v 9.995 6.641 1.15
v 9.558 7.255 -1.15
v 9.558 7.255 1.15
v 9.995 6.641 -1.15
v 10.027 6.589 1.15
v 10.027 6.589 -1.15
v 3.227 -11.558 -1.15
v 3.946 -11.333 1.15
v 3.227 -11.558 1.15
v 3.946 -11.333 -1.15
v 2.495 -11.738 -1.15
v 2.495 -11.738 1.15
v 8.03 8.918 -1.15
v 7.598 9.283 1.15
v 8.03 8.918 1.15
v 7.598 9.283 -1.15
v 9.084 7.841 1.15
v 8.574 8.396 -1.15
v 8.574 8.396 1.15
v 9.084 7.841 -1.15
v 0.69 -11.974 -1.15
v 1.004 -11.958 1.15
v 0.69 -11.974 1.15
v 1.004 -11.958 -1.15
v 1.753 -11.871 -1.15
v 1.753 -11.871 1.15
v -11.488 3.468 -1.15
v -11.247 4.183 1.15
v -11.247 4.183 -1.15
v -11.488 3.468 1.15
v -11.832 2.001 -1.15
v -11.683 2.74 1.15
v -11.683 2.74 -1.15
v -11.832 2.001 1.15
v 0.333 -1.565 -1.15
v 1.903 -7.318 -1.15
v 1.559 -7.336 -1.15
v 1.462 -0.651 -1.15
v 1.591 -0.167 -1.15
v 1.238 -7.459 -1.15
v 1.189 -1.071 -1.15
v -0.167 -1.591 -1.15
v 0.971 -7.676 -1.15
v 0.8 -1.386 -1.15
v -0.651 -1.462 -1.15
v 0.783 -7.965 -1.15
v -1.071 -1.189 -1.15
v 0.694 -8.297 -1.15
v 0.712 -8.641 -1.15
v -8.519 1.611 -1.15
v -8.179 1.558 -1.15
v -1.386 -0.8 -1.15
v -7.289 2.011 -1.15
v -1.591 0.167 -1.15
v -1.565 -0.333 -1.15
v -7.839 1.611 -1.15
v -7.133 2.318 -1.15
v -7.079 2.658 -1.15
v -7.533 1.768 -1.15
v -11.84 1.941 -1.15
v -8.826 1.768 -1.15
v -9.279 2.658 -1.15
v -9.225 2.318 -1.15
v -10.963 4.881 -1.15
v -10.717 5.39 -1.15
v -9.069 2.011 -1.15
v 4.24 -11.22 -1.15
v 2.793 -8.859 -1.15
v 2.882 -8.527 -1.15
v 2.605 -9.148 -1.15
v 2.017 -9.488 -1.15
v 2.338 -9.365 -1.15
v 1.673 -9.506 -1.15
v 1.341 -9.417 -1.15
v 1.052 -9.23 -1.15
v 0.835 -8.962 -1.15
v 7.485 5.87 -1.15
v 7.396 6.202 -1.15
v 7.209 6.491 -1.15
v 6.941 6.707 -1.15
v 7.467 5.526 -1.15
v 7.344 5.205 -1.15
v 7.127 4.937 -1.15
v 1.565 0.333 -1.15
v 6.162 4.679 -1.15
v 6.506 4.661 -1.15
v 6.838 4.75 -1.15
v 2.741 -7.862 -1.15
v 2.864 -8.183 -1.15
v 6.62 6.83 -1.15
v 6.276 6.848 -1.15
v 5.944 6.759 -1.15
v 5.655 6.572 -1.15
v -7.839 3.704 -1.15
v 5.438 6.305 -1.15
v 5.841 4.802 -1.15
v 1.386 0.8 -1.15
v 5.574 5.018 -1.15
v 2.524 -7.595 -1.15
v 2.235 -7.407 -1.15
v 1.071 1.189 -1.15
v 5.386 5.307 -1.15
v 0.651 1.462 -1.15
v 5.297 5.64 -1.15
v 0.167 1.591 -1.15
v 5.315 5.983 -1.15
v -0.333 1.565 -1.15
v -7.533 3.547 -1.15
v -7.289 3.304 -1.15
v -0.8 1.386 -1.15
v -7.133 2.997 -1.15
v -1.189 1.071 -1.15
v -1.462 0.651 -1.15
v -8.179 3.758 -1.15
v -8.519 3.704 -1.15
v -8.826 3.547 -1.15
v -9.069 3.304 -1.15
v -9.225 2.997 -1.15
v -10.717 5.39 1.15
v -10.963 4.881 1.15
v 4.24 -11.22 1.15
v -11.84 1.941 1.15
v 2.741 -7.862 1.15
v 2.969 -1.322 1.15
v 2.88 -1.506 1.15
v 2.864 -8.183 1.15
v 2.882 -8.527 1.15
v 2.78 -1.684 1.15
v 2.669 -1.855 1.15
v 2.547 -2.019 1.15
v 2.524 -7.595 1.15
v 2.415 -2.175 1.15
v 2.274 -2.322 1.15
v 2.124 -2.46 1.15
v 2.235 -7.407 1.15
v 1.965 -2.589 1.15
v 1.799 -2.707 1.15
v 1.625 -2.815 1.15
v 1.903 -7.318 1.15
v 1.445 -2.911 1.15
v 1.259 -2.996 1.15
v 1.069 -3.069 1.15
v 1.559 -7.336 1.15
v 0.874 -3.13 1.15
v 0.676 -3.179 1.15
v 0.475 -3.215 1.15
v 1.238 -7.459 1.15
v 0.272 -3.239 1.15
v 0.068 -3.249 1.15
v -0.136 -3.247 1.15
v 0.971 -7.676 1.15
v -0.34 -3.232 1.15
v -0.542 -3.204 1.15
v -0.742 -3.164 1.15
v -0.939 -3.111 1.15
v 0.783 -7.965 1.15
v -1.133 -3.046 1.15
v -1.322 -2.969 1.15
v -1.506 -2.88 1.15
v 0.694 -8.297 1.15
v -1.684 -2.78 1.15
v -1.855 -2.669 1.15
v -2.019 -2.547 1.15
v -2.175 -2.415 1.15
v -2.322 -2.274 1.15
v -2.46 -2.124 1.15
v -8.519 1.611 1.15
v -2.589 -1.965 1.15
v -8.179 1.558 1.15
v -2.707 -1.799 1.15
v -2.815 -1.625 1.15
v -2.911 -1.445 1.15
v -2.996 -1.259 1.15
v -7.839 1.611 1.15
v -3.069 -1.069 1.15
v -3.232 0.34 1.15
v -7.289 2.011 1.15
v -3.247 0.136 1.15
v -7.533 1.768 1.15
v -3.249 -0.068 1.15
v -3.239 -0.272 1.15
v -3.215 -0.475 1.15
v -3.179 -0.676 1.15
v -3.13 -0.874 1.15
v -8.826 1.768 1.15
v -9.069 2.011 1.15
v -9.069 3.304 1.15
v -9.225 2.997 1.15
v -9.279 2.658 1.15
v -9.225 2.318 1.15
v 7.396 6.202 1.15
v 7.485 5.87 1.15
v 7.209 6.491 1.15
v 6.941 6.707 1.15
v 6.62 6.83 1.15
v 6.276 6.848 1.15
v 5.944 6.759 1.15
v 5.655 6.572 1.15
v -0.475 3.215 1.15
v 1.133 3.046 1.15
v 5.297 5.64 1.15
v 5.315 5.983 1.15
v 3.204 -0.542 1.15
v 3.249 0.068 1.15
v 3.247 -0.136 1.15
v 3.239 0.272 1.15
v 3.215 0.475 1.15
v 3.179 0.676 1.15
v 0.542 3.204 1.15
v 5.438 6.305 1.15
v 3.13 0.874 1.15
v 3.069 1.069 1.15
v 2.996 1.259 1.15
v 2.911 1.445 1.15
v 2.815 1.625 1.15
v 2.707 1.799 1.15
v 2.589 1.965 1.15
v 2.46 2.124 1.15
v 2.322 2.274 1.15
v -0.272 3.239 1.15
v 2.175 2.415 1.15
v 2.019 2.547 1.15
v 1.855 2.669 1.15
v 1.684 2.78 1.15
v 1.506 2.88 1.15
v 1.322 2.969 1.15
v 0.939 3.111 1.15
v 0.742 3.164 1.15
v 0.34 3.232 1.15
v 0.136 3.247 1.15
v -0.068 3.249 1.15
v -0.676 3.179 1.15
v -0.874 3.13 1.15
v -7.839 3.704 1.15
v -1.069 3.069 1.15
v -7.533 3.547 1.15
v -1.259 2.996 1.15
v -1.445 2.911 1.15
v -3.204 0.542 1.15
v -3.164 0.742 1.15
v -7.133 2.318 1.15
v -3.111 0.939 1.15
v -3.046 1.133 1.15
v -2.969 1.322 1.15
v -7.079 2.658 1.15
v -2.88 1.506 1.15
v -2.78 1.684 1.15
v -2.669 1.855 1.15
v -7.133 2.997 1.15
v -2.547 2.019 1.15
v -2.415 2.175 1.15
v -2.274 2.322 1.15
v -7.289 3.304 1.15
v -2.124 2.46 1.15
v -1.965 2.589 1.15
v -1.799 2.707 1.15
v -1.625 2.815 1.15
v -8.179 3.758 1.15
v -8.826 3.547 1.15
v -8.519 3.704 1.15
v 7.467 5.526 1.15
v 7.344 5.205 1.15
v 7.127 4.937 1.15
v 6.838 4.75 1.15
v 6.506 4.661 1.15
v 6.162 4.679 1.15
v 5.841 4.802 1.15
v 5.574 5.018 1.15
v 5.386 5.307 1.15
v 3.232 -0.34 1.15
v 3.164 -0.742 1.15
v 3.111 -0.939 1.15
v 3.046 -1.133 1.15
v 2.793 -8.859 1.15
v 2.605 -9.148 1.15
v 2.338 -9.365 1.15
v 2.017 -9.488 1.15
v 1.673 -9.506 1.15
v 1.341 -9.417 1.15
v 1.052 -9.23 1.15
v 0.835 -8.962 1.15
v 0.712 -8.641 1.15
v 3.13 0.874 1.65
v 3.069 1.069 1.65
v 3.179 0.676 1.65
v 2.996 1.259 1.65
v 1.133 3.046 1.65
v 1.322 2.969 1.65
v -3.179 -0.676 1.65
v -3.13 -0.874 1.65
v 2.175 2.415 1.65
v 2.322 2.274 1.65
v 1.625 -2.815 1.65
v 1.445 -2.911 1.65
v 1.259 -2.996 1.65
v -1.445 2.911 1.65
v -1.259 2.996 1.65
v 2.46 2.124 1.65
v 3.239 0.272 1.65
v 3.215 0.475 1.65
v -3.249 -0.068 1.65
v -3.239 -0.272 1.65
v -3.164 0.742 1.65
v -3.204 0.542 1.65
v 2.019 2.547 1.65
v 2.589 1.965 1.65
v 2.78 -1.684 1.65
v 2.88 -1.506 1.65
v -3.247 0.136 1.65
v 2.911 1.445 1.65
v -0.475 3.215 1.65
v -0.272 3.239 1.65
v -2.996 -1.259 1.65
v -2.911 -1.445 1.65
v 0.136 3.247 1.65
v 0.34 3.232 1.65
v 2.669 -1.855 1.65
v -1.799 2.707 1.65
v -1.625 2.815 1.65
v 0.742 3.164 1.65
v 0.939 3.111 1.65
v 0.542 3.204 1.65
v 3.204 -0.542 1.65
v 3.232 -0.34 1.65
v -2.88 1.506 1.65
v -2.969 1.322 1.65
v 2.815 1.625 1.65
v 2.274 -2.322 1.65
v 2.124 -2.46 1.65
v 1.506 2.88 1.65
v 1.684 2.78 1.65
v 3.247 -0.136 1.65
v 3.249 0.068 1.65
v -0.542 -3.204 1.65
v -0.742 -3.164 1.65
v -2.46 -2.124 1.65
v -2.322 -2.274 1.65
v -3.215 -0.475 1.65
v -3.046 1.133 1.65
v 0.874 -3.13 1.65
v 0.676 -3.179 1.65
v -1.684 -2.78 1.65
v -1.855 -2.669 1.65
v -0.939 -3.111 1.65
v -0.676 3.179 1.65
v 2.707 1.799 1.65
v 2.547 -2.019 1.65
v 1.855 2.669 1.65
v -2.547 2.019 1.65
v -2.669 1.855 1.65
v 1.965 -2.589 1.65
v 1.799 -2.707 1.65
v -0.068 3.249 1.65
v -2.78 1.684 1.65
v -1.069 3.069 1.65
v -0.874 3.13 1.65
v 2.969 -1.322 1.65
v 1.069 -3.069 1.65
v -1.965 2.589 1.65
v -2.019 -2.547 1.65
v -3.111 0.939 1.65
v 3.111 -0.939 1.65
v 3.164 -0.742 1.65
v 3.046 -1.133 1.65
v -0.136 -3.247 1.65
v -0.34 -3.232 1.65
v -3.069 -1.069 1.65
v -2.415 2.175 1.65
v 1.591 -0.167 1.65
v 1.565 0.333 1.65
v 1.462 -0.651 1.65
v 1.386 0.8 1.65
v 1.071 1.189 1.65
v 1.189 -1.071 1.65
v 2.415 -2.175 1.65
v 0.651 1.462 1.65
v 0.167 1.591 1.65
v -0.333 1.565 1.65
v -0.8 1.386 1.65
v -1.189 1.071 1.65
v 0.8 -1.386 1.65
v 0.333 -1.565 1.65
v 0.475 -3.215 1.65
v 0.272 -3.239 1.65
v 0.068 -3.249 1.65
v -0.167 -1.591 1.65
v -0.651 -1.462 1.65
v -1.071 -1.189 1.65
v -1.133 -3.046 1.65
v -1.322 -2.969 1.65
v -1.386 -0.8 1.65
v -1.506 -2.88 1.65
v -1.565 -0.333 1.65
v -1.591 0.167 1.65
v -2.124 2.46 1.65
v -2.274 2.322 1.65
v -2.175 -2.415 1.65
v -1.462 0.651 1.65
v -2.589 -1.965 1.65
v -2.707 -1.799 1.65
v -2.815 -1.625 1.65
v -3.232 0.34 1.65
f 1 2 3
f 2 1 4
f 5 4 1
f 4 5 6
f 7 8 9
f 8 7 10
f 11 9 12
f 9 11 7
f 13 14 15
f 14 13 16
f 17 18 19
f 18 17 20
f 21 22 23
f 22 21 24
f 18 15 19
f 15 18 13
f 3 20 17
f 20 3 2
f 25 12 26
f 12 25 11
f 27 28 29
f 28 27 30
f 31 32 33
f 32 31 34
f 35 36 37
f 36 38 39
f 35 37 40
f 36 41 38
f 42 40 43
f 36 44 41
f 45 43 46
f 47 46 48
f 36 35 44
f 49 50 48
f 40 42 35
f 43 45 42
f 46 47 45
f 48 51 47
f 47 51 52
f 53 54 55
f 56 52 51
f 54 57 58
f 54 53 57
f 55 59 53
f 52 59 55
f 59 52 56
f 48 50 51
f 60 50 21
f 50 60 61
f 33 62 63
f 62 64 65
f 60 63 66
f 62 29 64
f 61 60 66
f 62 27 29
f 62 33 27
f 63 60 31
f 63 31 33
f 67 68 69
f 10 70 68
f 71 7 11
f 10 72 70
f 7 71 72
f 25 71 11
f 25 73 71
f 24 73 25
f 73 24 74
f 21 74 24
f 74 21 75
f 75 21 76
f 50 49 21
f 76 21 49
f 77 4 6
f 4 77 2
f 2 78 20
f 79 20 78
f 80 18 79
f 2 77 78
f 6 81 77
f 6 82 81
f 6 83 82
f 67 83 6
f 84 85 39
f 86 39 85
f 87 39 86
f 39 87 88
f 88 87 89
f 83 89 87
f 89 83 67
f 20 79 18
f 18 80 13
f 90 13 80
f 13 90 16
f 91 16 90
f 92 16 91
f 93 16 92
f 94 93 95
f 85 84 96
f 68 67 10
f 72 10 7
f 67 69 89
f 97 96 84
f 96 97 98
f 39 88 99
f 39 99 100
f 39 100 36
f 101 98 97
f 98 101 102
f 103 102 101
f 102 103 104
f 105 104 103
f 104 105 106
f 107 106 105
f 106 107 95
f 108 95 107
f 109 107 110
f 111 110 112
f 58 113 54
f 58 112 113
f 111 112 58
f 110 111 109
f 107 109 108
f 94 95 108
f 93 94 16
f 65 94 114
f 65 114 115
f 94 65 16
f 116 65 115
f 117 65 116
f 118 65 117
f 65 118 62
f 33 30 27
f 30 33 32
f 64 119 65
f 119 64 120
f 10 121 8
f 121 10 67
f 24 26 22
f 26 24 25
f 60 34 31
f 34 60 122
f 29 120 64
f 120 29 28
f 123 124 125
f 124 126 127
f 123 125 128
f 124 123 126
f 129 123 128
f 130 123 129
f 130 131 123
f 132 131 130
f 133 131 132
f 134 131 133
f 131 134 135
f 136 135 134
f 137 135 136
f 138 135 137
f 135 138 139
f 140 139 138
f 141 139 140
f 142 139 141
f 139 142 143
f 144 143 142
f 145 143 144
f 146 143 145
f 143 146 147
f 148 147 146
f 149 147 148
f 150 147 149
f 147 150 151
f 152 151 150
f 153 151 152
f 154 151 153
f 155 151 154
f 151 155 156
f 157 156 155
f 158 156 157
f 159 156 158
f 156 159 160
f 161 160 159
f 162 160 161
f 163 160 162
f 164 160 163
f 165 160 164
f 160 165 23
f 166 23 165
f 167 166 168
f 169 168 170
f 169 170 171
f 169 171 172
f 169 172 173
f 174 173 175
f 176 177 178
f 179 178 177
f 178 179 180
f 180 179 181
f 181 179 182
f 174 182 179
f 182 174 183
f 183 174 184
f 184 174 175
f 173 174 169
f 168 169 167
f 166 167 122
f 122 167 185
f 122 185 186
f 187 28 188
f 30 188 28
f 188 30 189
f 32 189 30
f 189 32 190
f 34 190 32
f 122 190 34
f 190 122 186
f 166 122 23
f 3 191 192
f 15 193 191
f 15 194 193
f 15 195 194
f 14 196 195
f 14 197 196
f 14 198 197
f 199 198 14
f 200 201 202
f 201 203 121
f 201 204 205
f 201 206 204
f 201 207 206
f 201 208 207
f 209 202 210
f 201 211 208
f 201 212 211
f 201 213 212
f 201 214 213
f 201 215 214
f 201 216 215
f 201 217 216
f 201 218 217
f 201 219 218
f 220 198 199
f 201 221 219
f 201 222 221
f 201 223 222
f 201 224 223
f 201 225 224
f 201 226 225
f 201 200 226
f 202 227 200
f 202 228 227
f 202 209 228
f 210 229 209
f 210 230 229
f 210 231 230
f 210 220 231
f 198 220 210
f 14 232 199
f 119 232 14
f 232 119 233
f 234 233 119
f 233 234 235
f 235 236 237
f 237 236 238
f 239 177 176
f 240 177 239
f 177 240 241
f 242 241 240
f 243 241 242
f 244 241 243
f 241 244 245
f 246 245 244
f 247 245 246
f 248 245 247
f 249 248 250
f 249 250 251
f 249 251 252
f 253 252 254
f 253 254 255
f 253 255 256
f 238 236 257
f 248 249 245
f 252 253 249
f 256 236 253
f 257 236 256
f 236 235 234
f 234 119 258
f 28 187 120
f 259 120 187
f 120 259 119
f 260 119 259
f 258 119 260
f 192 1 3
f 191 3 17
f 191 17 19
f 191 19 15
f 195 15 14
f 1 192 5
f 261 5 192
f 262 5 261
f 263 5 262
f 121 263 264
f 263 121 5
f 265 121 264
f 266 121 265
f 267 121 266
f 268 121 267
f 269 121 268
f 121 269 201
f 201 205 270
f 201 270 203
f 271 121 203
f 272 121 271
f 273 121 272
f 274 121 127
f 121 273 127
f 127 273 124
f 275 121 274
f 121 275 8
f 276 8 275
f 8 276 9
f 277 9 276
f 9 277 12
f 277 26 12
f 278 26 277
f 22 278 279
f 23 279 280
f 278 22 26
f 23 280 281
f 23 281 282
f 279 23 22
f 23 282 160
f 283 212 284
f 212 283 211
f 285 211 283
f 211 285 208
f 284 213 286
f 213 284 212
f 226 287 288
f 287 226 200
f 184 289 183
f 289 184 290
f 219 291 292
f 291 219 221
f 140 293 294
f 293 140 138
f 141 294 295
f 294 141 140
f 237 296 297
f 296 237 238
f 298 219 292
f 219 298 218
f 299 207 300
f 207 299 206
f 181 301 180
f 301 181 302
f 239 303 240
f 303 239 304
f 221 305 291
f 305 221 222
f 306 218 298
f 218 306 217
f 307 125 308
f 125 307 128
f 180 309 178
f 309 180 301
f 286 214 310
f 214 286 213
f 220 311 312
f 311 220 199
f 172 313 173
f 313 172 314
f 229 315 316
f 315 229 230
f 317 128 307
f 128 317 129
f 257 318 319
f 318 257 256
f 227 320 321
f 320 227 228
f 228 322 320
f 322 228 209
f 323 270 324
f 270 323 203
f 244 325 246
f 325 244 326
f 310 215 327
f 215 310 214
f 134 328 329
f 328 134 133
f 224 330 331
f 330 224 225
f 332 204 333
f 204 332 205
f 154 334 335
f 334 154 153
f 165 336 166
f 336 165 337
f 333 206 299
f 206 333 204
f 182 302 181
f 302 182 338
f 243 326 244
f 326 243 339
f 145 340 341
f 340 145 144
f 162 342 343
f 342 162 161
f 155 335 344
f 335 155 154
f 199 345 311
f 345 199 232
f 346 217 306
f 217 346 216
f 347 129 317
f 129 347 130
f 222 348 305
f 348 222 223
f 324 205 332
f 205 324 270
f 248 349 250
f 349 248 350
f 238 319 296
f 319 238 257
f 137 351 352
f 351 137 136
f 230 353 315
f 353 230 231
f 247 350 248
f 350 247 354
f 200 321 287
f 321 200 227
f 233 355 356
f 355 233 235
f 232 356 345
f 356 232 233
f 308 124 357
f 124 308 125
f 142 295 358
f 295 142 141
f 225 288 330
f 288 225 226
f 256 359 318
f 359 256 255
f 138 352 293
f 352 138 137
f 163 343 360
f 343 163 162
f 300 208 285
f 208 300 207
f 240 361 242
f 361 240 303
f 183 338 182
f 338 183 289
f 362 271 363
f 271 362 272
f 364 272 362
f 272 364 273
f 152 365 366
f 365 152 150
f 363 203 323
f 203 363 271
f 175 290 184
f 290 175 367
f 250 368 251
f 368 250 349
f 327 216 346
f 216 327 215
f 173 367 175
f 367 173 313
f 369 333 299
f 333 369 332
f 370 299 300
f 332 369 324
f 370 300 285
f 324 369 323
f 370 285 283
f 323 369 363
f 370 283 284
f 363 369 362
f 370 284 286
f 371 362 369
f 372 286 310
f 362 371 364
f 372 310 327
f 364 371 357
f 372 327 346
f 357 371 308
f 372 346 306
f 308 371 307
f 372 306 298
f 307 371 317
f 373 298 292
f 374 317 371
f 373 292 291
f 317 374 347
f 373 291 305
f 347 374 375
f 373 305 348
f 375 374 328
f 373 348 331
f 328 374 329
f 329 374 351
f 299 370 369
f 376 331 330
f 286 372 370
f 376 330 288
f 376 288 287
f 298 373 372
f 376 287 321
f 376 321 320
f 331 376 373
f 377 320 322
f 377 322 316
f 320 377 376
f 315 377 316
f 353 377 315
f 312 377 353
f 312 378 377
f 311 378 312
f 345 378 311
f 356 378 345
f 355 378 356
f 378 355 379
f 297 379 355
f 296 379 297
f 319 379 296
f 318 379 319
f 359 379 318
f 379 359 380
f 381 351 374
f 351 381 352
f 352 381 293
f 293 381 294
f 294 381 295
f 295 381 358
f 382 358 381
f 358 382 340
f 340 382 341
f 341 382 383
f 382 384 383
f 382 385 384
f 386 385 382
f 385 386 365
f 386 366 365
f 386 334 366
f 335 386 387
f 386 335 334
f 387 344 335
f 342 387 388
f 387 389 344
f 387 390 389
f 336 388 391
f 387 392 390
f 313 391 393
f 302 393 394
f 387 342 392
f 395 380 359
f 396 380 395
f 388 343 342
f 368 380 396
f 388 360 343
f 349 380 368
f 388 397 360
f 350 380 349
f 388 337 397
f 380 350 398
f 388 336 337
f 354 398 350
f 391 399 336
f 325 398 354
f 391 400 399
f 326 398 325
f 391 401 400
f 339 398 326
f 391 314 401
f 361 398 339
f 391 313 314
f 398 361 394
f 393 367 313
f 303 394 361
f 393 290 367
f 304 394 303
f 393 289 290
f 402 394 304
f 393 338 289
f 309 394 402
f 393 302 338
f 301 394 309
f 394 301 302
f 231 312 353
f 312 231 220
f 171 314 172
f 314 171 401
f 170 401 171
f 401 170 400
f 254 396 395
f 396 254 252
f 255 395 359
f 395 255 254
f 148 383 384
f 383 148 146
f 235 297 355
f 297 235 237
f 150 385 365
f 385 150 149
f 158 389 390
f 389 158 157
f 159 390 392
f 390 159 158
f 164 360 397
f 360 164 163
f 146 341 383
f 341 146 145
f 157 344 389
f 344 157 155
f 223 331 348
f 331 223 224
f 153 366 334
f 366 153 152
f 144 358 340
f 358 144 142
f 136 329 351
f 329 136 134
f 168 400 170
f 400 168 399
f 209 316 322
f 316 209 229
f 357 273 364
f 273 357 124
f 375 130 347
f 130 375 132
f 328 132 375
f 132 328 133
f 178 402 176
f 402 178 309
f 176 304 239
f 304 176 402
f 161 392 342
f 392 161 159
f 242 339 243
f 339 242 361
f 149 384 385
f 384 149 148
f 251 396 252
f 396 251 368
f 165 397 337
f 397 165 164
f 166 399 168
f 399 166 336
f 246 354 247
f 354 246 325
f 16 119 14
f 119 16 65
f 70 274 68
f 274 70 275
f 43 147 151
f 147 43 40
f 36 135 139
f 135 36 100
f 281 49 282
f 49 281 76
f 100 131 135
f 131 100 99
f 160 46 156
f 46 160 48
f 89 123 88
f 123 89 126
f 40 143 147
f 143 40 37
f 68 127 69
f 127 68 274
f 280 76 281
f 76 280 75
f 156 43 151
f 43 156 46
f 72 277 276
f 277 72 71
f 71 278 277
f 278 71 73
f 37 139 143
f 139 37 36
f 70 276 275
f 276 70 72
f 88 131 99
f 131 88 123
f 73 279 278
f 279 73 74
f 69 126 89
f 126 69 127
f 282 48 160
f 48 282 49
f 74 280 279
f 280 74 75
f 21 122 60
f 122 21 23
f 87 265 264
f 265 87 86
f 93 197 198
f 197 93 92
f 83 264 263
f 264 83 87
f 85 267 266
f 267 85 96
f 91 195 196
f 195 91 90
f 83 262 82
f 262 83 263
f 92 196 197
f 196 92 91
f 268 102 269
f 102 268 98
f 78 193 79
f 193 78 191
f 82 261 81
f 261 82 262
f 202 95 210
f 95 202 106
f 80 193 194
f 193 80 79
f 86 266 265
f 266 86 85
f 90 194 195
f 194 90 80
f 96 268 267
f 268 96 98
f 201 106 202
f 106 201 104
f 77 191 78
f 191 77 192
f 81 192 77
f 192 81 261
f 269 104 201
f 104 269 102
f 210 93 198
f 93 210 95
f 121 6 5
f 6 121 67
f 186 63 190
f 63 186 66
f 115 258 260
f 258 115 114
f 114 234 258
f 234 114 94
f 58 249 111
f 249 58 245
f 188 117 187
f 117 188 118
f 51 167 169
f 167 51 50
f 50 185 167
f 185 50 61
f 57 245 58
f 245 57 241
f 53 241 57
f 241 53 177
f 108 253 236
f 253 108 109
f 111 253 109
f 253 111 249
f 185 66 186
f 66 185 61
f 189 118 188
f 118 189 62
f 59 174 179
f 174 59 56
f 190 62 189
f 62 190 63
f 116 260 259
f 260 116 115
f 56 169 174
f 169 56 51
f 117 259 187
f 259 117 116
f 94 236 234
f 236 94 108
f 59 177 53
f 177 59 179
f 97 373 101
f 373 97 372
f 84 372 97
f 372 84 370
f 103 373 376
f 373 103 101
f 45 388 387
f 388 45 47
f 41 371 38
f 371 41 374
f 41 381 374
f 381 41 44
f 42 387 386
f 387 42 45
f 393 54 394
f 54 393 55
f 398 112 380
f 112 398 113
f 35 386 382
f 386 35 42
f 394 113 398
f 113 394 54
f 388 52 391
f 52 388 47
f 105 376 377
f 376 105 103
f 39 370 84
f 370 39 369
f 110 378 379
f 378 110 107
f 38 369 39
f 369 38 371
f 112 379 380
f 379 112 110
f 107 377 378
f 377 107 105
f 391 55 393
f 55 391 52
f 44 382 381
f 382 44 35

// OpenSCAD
// file: ../parameters.scad
global_clearance = 0.5;


//Main tube diameter - hole [mm]
main_tube_outer_diameter = 25.4;
main_tube_inner_diameter = 23.05;

// Nastavení parametrů rotoru

gliding_aggle = 14;         // tenhle úhel by se zřejmě v budoucnu měl počítat z požadované klouzavosti.

rotor_blade_AOA = 1.5;      // nastavení úhlu náběhu rotorového listu
rotor_blade_length = 970;   // délka rotorového listu
rotor_blade_depth = 50;     // hloubka rotorového listu
rotor_height = 180;         // výška otočného kloubu rotoru nad hlavní trubkou vírníku (odhad)
rotor_blades_count = 3;
rotor_delta_angle = 12;


rotor_head_width =  21.4;    //Rozměr 1 v nákresu
pilon_wall_thickness = 4.2;  // Rozměr 2 v nákresu
horizontal_screw_distance = 14.5;   // Rozměr 4 v nákresu
vertical_screw_distance = 12;       // rozměr 5 v nkresu

rotorhead_wall_thickness = 1.5; // sila tistenych dilu


bearing_outer_diameter = 6;    // Rozměr B1 v nákresu s přídavkem na toleranci otvoru
bearing_thickness = 7;        // Rozměr B2 v nákresu
bearing_shaft_length = 19.5;    // Rozměr B3 v nákresu


// nastavení parametrů motoru

engine_angle = -8;
engine_diameter = 55;
engine_offset = 55;

engine_screws_radius = 15;
engine_holes_radius = (24 + 44)/4;
engine_shatf_hole_diameter = 13;

// screw length step - minimum difference in length between two types of screws
basic_screw_length = 5;

//Screw diameter and nut for M5 [mm]
M5_screw_diameter=5.5;
M5_head_height = 5;
M5_head_diameter = 13+0.5;
M5_nut_height = 4.5;
M5_nut_diameter = 9.4;
M5_nut_pocket = 8.4;

//Screw diameter and nut for M4 [mm]
M4_screw_diameter=4.5;
M4_screw_head_height = 4;
M4_nut_height = 3.2;
M4_nut_diameter = 8.4;
M4_nut_pocket = 7.5;

//Screw diameter and nut for M3 [mm]
M3_screw_diameter = 3.2;
M3_nut_height = 2.7;
M3_nut_diameter = 6.6;
M3_screw_head_height = 3;
M3_nut_pocket = 5.6;


//Screw diameter and nut for M2,5 [mm]
M2_5_screw_diameter = 2.7;
M2_5_nut_height = 2.3;
M2_5_nut_diameter = 6;
M2_5_nut_pocket = 5.1;

//Screw diameter and nut for M2 [mm]
M2_screw_diameter = 2.2;
M2_nut_height = 1.8;
M2_nut_diameter = 4.5;
M2_nut_pocket = 3.95;



//šroub servo
Servo_screw = 1.5;
Servo_nut_height = 1;
Servo_nut_diameter = 2.7;



//center_of_gravity_position = [main_pilon_position - tan(gliding_aggle)*rotor_height, 0, 0];


////podzvozek

radius_undercarriage = 25;
vzdalenost_x = tan(20) * 131;
vzdalenost_y = (131 - radius_undercarriage)/tan(79);
uhel_y = 90 - 20;
uhel_x = 90 - 79;

maximum_printable_size = 150;


////Pitotova trubice
Pitot_tube_diameter = 4.02 + 1;
Distance_hole_from_tube = 11.92;  //vzdálenost otvoru pro připevnění od samotné trubičky
// main file
include <../parameters.scad>

module 111_1004(){
    
    angle_between_blades = 360 / rotor_blades_count;
    rotor_center_plate_size = 30;
    rotor_mounting_plate_size = 20;
    shaft_diameter = M3_screw_diameter;
    thickness = 2.3; 
    blade_screws_distance = (16.47+11.86)/2;
    
    edge_distance = 15;
    spacer_disc_diameter = M4_screw_diameter + 2;
    spare_disc_height = 0.6;
    
    rotate([0,0, rotor_delta_angle]) {
        difference() {
            union(){
                cylinder(r = 3+9, h = thickness, center = true, $fn = 100);
                translate([0,0,-thickness/2])
                    cylinder(d = spacer_disc_diameter, h = thickness + 0.5, $fn = 100);
                }
                    cylinder(d = shaft_diameter, h = 3* thickness, center = true, $fn = 20);
                
               

            for (i = [1:rotor_blades_count]){
                rotate([0, 0, i*angle_between_blades + angle_between_blades/2 + 180])
                    translate([0, edge_distance, 0])
                        cube([30, 15, 10], center = true);
                rotate([0,0, i*angle_between_blades + angle_between_blades/2])
                    translate([0, 3 + 4.5 + M2_screw_diameter/2, 0])
                        cylinder(d = M2_screw_diameter, h = 2* thickness, center = true, $fn = 20);
            }
        }
    }
}
    
111_1004();
